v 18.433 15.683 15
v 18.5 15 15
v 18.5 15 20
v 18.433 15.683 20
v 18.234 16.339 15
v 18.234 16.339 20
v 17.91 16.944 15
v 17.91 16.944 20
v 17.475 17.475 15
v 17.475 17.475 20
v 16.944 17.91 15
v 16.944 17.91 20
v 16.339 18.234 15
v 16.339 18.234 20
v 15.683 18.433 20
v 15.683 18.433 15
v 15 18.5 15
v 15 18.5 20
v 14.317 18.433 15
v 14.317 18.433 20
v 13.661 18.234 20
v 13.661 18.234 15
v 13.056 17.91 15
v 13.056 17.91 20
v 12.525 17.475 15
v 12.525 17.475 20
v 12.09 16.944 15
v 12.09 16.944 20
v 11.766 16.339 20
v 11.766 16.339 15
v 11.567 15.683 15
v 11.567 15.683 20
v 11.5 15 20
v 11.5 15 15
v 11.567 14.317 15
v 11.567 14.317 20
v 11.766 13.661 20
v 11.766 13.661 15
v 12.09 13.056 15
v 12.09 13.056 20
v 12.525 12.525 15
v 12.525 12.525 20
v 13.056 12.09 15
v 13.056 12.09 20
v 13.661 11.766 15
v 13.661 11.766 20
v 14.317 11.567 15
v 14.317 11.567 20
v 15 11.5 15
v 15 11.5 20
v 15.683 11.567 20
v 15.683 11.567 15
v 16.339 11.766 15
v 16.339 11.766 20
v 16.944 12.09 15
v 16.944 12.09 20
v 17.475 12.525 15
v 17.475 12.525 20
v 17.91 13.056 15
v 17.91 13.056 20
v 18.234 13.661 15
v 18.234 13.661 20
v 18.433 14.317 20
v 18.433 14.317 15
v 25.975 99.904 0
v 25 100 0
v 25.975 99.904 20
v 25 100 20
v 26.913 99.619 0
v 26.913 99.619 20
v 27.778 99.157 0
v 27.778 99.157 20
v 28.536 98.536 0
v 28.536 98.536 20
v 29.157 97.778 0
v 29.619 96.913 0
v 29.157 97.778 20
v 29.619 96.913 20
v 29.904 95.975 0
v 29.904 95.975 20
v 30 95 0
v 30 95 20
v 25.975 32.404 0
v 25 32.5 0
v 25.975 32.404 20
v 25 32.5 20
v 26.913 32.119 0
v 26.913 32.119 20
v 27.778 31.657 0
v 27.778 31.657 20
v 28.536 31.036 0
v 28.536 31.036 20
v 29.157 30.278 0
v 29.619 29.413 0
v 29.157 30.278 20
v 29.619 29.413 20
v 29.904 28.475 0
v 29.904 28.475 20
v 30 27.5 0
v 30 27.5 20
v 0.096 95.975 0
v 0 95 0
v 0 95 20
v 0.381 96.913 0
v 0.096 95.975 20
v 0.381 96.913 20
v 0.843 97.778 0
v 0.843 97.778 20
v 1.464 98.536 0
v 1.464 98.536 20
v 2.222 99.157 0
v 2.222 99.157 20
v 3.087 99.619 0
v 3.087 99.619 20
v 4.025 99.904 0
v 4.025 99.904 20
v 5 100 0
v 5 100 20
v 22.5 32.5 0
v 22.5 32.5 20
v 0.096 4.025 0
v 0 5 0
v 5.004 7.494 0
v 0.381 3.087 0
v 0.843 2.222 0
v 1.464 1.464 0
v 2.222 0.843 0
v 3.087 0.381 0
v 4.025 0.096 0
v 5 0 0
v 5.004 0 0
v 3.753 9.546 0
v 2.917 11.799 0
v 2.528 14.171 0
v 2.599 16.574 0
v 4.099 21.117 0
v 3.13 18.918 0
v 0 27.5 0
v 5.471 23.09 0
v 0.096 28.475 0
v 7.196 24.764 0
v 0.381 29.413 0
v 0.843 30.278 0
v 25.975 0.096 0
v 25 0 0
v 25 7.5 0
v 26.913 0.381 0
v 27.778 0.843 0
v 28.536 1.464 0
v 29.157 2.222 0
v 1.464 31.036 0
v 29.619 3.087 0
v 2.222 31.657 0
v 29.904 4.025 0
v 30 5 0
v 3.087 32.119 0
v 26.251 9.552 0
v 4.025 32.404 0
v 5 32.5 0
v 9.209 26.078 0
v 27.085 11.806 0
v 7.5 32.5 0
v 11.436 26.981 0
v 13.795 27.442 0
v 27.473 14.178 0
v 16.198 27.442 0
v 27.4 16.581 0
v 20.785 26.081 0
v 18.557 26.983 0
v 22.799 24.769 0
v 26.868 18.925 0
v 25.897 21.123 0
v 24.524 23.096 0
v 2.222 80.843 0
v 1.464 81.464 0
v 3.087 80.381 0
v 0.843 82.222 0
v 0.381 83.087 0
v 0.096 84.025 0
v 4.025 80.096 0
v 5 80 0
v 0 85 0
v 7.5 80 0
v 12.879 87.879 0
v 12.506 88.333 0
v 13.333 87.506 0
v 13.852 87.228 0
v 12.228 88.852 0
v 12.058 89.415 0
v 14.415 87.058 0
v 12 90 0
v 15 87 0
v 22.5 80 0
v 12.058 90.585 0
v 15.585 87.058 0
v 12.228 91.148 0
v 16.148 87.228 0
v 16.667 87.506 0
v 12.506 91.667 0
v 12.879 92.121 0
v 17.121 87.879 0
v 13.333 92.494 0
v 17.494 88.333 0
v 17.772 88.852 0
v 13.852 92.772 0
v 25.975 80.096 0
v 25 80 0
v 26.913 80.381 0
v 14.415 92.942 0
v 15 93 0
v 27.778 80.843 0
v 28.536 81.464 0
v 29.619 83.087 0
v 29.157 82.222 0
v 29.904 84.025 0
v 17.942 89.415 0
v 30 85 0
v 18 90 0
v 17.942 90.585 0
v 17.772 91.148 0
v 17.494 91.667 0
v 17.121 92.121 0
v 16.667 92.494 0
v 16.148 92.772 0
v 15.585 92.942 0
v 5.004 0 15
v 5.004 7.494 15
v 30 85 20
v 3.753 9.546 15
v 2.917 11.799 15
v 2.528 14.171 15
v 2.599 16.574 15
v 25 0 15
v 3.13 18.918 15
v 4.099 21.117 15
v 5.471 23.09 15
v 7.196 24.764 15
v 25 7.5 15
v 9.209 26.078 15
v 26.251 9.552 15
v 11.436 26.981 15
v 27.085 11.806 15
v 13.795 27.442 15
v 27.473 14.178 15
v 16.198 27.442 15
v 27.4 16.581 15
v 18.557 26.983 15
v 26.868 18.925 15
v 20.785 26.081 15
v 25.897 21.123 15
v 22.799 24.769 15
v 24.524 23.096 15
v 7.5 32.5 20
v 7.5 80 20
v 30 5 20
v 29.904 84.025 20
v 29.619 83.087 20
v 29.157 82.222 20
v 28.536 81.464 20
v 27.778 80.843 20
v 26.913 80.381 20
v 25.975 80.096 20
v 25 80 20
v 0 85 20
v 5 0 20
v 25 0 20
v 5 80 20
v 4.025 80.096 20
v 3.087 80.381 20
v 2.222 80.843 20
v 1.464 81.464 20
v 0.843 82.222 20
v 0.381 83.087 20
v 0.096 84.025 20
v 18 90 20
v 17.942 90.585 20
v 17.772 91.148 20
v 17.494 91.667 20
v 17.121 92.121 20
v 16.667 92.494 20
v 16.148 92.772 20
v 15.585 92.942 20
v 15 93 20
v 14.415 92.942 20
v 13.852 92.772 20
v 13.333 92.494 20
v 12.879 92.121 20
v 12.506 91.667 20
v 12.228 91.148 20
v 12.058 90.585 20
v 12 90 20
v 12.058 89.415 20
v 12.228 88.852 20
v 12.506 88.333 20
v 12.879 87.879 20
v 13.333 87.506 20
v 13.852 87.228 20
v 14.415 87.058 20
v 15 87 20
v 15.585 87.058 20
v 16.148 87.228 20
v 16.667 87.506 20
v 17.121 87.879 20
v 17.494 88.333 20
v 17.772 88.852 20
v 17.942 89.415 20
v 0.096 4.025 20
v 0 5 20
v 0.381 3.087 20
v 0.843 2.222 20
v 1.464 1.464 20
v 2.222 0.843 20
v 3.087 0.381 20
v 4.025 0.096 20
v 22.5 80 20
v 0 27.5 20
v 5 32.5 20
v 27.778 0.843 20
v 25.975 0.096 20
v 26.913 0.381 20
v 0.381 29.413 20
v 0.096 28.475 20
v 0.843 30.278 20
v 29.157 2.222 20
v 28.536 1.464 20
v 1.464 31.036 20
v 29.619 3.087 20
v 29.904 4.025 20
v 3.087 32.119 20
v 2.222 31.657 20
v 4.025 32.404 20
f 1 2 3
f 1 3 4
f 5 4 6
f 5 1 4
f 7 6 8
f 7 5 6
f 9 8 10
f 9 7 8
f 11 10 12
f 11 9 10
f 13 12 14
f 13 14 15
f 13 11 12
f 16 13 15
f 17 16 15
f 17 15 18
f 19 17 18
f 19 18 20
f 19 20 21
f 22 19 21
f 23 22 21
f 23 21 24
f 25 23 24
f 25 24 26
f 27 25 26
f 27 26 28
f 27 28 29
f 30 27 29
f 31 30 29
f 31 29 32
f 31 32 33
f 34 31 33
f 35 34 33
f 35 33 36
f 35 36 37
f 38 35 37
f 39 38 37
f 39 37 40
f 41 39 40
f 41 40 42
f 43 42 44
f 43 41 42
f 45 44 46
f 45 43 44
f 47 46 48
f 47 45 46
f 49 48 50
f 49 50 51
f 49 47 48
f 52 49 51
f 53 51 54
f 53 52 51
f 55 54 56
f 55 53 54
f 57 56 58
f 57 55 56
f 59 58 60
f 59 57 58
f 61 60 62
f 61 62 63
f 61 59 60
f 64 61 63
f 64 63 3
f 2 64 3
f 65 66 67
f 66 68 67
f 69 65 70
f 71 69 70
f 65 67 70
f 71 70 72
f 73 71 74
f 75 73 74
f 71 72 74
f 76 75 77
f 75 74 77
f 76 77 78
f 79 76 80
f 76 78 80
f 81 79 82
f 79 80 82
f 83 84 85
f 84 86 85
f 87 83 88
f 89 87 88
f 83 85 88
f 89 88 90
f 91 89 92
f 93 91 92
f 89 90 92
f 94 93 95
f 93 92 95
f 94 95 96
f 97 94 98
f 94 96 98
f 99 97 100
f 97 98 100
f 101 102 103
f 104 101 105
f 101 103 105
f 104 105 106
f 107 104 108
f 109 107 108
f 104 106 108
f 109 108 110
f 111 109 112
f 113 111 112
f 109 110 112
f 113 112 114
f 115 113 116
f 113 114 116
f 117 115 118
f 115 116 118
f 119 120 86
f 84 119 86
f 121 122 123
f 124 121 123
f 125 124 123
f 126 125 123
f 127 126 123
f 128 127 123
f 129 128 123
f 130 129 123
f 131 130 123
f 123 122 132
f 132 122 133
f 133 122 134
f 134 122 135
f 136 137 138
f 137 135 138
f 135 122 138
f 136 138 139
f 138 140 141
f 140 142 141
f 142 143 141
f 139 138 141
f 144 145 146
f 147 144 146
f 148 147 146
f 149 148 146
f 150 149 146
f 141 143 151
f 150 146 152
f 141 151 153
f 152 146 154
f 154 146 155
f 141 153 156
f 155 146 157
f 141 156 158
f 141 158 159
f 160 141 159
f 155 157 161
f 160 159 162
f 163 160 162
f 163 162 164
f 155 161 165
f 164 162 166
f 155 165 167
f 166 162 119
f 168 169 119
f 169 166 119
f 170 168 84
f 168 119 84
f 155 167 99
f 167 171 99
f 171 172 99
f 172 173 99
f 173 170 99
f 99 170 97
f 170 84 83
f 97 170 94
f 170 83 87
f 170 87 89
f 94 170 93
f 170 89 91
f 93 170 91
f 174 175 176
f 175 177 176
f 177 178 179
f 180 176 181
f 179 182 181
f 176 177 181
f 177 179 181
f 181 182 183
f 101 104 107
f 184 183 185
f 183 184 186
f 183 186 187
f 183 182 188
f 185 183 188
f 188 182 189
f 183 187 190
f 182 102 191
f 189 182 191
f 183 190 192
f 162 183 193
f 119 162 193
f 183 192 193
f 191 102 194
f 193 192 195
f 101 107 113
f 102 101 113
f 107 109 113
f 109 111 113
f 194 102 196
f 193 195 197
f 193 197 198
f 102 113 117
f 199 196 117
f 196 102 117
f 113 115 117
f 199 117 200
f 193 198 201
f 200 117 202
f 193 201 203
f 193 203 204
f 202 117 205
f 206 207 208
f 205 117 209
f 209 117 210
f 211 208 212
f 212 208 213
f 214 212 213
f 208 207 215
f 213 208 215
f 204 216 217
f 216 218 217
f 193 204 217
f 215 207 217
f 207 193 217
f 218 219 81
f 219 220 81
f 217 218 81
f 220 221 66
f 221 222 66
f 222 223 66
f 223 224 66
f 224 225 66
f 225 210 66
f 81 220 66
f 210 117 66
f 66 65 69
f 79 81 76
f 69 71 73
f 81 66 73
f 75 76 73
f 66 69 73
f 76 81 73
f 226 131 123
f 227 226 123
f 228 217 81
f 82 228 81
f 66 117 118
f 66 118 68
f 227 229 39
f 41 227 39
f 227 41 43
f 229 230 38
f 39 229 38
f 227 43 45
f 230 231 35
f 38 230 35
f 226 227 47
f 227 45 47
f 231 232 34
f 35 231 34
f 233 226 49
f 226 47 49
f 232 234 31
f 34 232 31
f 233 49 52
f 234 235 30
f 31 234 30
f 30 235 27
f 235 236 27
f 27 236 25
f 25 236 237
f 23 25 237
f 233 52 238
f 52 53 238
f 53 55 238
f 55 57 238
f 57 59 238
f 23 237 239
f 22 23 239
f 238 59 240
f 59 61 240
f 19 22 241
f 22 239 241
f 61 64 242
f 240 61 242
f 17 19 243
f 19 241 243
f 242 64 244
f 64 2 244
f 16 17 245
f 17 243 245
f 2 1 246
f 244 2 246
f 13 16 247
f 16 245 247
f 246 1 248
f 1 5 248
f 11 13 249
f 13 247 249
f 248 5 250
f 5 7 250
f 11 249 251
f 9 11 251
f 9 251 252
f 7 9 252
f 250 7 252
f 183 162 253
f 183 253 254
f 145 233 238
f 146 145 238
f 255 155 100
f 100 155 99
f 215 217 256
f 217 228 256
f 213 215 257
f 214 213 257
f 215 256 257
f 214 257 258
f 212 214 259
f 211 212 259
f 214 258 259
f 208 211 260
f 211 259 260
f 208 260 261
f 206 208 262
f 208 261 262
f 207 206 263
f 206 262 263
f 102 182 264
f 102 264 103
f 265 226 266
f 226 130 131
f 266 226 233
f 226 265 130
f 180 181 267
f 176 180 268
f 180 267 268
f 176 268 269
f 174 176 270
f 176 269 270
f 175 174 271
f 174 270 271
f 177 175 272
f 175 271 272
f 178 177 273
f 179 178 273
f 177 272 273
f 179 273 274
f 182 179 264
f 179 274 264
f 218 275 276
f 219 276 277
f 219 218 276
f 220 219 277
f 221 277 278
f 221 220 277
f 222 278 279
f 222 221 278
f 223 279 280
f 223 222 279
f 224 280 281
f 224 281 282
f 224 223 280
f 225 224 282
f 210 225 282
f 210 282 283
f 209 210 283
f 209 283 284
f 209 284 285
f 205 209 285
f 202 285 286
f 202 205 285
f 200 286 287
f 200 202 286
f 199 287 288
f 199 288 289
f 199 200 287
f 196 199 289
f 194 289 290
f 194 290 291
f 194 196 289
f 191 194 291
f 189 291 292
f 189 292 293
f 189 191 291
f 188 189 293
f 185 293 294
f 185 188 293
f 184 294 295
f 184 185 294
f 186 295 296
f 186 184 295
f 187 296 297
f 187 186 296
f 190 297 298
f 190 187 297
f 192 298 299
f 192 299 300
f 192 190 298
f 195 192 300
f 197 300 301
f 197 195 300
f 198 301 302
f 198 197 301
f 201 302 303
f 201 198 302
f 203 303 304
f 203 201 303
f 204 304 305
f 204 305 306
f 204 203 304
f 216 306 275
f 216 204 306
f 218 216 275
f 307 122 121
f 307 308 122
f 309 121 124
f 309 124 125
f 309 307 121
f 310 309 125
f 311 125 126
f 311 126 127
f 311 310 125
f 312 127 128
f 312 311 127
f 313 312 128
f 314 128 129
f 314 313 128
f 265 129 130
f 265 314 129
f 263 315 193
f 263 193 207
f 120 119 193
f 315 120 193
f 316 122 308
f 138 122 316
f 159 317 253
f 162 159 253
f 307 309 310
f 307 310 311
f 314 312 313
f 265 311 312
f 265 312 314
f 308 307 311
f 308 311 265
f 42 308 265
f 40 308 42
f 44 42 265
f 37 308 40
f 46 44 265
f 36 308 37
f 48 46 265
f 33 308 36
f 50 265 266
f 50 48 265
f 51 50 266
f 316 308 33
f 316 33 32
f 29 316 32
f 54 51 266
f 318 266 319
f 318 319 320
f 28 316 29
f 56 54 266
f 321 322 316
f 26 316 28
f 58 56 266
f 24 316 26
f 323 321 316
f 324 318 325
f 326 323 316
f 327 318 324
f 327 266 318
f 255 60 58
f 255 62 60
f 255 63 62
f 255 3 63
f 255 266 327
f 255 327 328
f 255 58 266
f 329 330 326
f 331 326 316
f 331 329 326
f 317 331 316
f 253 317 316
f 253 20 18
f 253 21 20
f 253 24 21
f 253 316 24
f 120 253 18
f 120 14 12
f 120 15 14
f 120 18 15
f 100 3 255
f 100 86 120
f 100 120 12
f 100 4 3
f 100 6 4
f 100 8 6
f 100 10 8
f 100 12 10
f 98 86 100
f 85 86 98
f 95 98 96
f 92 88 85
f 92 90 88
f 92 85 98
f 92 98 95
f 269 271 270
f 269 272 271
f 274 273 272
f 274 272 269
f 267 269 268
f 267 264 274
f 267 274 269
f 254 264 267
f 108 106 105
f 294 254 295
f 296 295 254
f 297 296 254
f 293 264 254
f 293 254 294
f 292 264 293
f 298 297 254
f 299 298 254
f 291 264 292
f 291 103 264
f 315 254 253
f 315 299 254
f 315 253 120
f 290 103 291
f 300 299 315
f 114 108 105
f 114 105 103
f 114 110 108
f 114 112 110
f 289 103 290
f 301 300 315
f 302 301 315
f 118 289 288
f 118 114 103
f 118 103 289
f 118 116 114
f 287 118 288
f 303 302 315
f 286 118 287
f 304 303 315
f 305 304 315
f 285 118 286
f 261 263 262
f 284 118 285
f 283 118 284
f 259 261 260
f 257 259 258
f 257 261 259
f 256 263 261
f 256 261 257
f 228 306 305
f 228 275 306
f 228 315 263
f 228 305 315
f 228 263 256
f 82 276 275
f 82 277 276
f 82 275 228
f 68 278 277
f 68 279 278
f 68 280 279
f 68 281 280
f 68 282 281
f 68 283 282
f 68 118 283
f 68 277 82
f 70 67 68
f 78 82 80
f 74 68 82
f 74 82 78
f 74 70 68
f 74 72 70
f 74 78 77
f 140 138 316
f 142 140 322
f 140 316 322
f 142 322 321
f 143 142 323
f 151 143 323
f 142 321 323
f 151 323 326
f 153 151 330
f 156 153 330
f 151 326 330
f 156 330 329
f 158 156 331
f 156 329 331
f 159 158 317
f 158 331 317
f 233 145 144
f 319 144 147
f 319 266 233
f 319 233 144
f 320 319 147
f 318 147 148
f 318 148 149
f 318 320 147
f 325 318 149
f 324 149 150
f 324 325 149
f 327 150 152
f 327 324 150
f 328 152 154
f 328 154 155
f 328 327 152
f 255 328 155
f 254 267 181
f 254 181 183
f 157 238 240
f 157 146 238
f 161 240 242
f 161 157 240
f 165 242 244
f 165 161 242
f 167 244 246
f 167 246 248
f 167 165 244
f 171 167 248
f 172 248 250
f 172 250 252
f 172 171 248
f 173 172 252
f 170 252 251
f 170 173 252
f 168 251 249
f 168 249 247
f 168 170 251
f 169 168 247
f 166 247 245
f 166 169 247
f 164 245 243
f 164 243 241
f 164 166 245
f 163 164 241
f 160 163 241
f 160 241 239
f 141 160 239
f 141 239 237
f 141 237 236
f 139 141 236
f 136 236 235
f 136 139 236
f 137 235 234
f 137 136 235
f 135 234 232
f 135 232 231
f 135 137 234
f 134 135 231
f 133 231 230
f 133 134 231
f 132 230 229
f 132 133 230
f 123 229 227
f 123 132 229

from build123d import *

# Parameters (mm, degrees)
F0_W      = 30
F0_H      = 100
F1_DEPTH  = 20
F2_R      = 12.5
F3_DEPTH  = 15
F4_R      = 3.5
F5_DEPTH  = 20
F6_R      = 3
F7_DEPTH  = 20
F8_W      = 7.5
F8_H      = 47.5
F9_DEPTH  = 20
F10_W     = 7.5
F10_H     = 47.5
F11_DEPTH = 20
F12_R     = 5
F13_R     = 5
F14_W     = 19.995708
F14_H     = 15
F15_DEPTH = 15


with BuildPart() as f1:
    # F0 (on Top) → F1 (new body)
    with BuildSketch(Plane.XY):
        with Locations((15, 50)):
            Rectangle(F0_W, F0_H)
    extrude(amount=F1_DEPTH)

    # F2 (on Top) → F3 (cut)
    with BuildSketch(Plane.XY):
        with Locations((15, 15)):
            Circle(F2_R)
    extrude(amount=F3_DEPTH, mode=Mode.SUBTRACT)

    # F4 (on Top) → F5 (cut)
    with BuildSketch(Plane.XY):
        with Locations((15, 15)):
            Circle(F4_R)
    extrude(amount=F5_DEPTH, mode=Mode.SUBTRACT)

    # F6 (on Top) → F7 (cut)
    with BuildSketch(Plane.XY):
        with Locations((15, 90)):
            Circle(F6_R)
    extrude(amount=F7_DEPTH, mode=Mode.SUBTRACT)

    # F8 (on Top) → F9 (cut)
    with BuildSketch(Plane.XY):
        with Locations((3.75, 56.25)):
            Rectangle(F8_W, F8_H)
    extrude(amount=F9_DEPTH, mode=Mode.SUBTRACT)

    # F10 (on Top) → F11 (cut)
    with BuildSketch(Plane.XY):
        with Locations((26.25, 56.25)):
            Rectangle(F10_W, F10_H)
    extrude(amount=F11_DEPTH, mode=Mode.SUBTRACT)

    # F12
    f12_edges = [f1.edges().sort_by_distance(p)[0] for p in [
        (30, 32.5, 10),
        (30, 0, 10),
        (0, 0, 10),
        (0, 32.5, 10),
    ]]
    fillet(f12_edges, radius=F12_R)

    # F13
    f13_edges = [f1.edges().sort_by_distance(p)[0] for p in [
        (0, 100, 10),
        (0, 80, 10),
        (30, 100, 10),
        (30, 80, 10),
    ]]
    fillet(f13_edges, radius=F13_R)

    # F14 (on Top) → F15 (cut)
    with BuildSketch(Plane.XY):
        with Locations((15.002146, 7.5)):
            Rectangle(F14_W, F14_H)
    extrude(amount=F15_DEPTH, mode=Mode.SUBTRACT)


solid = f1.part
